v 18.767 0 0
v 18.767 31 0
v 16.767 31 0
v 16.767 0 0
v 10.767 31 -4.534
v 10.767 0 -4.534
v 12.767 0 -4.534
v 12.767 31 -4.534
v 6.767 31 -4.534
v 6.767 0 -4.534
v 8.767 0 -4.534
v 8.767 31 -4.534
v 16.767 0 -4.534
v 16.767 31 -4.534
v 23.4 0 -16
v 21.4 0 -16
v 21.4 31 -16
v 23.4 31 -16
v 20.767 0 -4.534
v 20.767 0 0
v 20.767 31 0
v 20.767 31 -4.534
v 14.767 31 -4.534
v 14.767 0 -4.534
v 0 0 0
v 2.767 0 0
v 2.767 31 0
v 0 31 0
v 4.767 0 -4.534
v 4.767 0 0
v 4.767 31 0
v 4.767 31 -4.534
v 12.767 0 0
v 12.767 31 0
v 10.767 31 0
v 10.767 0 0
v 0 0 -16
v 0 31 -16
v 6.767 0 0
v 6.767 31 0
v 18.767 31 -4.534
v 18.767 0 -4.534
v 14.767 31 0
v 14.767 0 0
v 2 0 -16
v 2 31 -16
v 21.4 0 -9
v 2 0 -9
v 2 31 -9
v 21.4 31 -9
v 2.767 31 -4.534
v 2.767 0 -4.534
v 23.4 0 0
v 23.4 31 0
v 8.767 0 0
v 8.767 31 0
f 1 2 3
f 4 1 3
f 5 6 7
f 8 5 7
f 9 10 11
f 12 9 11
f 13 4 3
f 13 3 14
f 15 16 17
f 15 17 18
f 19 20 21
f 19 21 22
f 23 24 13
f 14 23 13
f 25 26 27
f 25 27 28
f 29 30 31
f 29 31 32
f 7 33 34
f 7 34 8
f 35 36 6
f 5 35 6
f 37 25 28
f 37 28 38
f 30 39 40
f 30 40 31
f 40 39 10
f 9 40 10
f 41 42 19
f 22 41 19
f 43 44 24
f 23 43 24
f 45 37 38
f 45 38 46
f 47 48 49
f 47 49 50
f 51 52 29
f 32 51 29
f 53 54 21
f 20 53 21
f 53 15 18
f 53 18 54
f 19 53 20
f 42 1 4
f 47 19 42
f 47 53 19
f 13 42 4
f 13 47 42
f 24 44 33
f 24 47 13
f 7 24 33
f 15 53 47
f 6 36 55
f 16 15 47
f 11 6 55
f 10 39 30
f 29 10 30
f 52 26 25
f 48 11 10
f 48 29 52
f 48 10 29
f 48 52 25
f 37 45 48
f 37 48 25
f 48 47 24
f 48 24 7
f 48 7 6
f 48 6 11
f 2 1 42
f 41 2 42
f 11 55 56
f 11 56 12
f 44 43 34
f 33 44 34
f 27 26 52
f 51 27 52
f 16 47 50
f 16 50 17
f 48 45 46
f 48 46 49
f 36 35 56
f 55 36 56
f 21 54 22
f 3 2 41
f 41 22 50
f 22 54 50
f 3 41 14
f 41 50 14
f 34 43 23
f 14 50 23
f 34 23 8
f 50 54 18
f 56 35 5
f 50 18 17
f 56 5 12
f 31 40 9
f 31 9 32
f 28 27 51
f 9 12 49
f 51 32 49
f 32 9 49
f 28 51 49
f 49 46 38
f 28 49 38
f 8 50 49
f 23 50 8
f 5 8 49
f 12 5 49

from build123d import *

# Parameters (mm, degrees)
BOSS_EXTRUDE1_DEPTH = 31
SKETCH2_W           = 2
SKETCH2_H           = 4.533544861
CUT_EXTRUDE1_DEPTH  = 32


with BuildPart() as part:
    # Sketch1 → Boss-Extrude1 (new body)
    with BuildSketch(Plane(origin=(0, 0, 0), x_dir=(1, 0, 0), z_dir=(0, 1, 0))):
        Polygon((21.4, 16), (23.4, 16), (23.4, 0), (0, 0), (0, 16), (2, 16), (2, 9), (21.4, 9), align=None)
    extrude(amount=BOSS_EXTRUDE1_DEPTH)

    # Sketch2 → Cut-Extrude1 (cut, through all)
    with BuildSketch(Plane(origin=(0, 31, 0), x_dir=(1, 0, 0), z_dir=(0, 1, 0))):
        with Locations((3.766668881, 2.266772431)):
            Rectangle(SKETCH2_W, SKETCH2_H)
        with Locations((7.766668881, 2.266772431)):
            Rectangle(SKETCH2_W, SKETCH2_H)
        with Locations((11.766668881, 2.266772431)):
            Rectangle(SKETCH2_W, SKETCH2_H)
        with Locations((15.766668881, 2.266772431)):
            Rectangle(SKETCH2_W, SKETCH2_H)
        with Locations((19.766668881, 2.266772431)):
            Rectangle(SKETCH2_W, SKETCH2_H)
    extrude(amount=-CUT_EXTRUDE1_DEPTH, mode=Mode.SUBTRACT)


solid = part.part
